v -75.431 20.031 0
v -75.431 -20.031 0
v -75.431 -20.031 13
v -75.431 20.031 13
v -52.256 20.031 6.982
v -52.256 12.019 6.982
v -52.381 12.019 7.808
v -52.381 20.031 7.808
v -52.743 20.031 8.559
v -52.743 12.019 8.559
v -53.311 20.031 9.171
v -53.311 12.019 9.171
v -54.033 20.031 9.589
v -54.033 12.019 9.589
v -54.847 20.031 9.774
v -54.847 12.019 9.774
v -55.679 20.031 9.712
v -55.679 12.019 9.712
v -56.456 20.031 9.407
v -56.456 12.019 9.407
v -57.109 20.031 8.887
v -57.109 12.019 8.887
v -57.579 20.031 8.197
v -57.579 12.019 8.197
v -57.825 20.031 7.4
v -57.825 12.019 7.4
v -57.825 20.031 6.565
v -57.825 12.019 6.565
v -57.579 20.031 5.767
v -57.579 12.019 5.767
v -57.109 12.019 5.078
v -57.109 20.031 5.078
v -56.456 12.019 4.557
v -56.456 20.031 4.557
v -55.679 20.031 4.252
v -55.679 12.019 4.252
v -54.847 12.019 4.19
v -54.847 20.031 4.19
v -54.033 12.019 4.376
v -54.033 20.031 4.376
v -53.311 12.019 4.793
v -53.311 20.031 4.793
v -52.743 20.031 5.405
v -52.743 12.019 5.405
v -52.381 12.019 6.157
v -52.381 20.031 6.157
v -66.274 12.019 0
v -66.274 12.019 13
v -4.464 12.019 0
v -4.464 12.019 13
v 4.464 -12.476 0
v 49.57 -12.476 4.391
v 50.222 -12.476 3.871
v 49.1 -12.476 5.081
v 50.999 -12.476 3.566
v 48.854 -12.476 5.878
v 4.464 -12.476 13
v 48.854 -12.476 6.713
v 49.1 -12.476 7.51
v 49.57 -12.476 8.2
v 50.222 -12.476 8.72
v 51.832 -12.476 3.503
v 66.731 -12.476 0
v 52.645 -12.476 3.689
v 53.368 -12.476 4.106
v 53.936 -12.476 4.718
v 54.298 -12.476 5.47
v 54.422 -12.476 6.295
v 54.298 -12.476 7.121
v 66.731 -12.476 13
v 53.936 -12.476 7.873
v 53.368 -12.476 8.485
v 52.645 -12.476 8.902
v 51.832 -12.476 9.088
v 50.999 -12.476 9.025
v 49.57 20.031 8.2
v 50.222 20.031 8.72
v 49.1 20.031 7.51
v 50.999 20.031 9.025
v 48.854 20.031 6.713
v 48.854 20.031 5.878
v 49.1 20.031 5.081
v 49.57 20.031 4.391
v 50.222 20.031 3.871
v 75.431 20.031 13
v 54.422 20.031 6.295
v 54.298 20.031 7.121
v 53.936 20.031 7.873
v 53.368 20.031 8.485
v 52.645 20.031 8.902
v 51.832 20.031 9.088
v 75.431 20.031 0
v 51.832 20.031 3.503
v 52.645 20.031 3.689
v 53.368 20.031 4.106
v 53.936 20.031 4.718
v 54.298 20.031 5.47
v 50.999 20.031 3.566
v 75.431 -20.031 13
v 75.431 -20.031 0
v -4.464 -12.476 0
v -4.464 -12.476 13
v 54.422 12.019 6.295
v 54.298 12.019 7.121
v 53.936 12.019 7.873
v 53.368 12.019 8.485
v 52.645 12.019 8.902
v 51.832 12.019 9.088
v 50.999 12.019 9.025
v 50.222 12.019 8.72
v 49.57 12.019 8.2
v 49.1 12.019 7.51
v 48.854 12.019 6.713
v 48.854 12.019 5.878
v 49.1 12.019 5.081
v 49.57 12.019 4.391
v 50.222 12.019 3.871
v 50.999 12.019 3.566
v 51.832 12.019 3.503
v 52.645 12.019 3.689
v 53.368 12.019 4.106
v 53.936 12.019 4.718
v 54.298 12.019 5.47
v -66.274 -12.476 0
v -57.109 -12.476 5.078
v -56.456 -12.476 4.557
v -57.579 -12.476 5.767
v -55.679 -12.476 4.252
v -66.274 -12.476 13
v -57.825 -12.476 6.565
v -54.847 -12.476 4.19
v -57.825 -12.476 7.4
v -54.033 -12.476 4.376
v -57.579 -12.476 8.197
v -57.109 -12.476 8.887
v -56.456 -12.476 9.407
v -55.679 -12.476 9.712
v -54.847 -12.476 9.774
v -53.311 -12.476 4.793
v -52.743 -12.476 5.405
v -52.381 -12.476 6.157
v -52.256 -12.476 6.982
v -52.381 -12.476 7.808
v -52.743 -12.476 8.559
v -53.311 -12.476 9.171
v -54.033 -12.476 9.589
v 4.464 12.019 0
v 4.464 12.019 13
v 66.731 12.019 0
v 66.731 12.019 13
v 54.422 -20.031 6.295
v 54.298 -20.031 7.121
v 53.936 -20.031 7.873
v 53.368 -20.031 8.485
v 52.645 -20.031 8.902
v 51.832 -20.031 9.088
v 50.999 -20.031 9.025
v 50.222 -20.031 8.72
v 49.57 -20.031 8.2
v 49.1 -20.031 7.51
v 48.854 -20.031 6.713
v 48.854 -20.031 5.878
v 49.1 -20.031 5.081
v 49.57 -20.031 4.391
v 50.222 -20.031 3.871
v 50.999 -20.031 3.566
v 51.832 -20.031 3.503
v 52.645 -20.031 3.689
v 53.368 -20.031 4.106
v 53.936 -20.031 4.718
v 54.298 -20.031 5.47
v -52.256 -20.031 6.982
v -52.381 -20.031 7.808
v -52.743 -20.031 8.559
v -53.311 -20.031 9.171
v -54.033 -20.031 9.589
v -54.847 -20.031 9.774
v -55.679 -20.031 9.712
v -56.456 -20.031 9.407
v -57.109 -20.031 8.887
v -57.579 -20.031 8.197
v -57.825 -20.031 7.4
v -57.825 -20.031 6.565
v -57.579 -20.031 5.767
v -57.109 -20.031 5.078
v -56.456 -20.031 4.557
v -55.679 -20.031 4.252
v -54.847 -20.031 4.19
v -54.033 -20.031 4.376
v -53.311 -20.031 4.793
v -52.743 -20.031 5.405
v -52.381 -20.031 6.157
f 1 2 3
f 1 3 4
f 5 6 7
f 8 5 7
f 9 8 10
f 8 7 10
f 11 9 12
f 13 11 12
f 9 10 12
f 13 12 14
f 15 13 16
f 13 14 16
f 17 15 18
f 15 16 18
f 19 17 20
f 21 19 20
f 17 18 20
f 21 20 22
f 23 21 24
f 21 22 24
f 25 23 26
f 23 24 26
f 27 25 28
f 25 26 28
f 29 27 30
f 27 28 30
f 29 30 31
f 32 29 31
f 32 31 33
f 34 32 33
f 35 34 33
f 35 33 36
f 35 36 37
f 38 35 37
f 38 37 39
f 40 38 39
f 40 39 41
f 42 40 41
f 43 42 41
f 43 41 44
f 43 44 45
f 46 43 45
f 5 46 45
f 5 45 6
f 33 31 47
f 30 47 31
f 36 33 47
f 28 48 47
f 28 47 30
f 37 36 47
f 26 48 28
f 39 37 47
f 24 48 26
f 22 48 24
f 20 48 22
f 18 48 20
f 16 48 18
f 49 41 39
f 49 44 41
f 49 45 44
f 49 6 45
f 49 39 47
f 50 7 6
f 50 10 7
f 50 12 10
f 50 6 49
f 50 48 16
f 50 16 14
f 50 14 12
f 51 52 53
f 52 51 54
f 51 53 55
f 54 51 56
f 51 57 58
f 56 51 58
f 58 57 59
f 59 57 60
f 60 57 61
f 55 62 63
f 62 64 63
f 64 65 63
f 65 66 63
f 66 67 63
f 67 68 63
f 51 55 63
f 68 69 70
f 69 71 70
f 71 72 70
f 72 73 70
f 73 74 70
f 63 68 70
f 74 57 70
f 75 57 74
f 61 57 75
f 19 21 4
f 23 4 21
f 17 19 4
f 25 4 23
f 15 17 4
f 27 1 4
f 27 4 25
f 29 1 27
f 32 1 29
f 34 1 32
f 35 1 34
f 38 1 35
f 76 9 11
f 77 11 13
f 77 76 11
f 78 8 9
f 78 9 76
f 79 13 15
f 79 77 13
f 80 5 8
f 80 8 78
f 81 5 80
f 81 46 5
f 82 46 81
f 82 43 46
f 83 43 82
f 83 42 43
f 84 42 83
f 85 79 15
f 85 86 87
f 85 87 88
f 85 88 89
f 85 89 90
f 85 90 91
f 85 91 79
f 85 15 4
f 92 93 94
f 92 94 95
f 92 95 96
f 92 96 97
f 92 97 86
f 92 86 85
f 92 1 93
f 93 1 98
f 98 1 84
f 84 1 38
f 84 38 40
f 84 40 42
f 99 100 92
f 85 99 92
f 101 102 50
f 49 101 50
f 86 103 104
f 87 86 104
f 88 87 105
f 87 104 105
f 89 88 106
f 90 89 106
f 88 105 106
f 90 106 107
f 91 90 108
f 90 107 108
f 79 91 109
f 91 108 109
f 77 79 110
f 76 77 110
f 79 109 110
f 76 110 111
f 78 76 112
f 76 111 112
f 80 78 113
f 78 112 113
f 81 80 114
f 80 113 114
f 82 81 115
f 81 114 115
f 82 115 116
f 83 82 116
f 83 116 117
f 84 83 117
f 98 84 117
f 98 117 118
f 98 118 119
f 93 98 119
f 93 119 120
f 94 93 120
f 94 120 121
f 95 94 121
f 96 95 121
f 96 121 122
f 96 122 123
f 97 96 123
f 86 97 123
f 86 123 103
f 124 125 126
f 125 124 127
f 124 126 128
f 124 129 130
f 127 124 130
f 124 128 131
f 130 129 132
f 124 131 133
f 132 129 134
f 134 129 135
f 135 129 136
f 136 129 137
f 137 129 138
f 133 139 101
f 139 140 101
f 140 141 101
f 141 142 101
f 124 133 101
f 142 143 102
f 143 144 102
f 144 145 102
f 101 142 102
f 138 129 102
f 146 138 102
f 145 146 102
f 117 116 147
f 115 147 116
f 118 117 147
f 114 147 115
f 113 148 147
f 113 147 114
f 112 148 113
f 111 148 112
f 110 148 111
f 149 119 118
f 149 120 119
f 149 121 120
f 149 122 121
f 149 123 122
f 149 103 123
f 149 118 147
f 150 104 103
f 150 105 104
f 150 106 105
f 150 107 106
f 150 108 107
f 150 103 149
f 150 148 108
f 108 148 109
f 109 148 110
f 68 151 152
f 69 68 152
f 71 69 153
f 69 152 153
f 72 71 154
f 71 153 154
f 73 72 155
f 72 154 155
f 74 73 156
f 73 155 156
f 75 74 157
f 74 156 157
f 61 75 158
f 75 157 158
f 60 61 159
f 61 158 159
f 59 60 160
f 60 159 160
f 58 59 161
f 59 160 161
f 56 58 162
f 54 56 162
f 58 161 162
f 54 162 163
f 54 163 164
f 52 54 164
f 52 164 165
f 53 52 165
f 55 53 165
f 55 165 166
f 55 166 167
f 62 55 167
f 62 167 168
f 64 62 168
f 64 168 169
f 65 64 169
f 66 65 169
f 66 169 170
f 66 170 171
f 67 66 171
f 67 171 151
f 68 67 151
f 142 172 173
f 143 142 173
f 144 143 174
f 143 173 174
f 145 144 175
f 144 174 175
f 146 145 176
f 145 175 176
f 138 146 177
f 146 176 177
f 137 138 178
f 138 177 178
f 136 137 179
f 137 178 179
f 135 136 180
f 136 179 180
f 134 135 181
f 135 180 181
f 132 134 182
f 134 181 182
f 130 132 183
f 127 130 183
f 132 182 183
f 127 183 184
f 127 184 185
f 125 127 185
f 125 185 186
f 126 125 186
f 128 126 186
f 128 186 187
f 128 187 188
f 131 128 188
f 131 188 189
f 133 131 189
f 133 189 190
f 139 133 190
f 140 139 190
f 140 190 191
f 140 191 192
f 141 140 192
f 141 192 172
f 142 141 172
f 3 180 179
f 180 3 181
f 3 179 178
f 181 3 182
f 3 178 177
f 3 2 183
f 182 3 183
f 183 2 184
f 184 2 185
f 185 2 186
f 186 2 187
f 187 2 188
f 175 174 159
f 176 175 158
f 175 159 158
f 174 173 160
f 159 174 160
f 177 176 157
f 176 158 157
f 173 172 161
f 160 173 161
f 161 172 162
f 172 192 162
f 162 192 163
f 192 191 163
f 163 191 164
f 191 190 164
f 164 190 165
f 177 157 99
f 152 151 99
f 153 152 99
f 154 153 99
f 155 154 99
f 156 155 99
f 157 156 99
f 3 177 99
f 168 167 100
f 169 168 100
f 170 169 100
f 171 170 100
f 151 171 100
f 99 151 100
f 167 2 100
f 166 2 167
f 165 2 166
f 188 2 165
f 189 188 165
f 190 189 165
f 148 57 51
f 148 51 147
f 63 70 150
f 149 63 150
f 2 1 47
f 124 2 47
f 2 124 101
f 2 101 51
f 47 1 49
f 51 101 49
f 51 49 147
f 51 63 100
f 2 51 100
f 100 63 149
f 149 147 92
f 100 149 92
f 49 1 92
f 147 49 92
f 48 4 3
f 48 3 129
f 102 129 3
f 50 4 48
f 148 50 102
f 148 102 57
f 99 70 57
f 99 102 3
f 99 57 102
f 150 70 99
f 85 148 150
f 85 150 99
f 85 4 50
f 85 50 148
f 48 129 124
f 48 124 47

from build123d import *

# Parameters (mm, degrees)
F0_W     = 150.861204
F0_H     = 40.061776
F1_DEPTH = 13
F2_W     = 133.00509
F2_H     = 24.494914
F3_DEPTH = 25
F4_W     = 8.928052
F4_H     = 32.736194
F5_DEPTH = 13
F7_D     = 5.6


with BuildPart() as f1:
    # F0 (on Top) → F1 (new body)
    with BuildSketch(Plane.XY):
        Rectangle(F0_W, F0_H)
    extrude(amount=F1_DEPTH)

    # F2 (on face) → F3 (cut)
    with BuildSketch(Plane.XY.offset(13)):
        with Locations((0.228923, -0.228925)):
            Rectangle(F2_W, F2_H)
    extrude(amount=-F3_DEPTH, mode=Mode.SUBTRACT)

    # F4 (on face) → F5 (join)
    with BuildSketch(Plane.XY.offset(13)):
        Rectangle(F4_W, F4_H)
    extrude(amount=-F5_DEPTH)

    # F7 (through all)
    with Locations(Plane(origin=(0, 20.030888, 0), x_dir=(-1, 0, 0), z_dir=(0, 1, 0))):
        with Locations((55.056326, 6.982195), (-51.622458, 6.295422)):
            Hole(F7_D / 2)


solid = f1.part
